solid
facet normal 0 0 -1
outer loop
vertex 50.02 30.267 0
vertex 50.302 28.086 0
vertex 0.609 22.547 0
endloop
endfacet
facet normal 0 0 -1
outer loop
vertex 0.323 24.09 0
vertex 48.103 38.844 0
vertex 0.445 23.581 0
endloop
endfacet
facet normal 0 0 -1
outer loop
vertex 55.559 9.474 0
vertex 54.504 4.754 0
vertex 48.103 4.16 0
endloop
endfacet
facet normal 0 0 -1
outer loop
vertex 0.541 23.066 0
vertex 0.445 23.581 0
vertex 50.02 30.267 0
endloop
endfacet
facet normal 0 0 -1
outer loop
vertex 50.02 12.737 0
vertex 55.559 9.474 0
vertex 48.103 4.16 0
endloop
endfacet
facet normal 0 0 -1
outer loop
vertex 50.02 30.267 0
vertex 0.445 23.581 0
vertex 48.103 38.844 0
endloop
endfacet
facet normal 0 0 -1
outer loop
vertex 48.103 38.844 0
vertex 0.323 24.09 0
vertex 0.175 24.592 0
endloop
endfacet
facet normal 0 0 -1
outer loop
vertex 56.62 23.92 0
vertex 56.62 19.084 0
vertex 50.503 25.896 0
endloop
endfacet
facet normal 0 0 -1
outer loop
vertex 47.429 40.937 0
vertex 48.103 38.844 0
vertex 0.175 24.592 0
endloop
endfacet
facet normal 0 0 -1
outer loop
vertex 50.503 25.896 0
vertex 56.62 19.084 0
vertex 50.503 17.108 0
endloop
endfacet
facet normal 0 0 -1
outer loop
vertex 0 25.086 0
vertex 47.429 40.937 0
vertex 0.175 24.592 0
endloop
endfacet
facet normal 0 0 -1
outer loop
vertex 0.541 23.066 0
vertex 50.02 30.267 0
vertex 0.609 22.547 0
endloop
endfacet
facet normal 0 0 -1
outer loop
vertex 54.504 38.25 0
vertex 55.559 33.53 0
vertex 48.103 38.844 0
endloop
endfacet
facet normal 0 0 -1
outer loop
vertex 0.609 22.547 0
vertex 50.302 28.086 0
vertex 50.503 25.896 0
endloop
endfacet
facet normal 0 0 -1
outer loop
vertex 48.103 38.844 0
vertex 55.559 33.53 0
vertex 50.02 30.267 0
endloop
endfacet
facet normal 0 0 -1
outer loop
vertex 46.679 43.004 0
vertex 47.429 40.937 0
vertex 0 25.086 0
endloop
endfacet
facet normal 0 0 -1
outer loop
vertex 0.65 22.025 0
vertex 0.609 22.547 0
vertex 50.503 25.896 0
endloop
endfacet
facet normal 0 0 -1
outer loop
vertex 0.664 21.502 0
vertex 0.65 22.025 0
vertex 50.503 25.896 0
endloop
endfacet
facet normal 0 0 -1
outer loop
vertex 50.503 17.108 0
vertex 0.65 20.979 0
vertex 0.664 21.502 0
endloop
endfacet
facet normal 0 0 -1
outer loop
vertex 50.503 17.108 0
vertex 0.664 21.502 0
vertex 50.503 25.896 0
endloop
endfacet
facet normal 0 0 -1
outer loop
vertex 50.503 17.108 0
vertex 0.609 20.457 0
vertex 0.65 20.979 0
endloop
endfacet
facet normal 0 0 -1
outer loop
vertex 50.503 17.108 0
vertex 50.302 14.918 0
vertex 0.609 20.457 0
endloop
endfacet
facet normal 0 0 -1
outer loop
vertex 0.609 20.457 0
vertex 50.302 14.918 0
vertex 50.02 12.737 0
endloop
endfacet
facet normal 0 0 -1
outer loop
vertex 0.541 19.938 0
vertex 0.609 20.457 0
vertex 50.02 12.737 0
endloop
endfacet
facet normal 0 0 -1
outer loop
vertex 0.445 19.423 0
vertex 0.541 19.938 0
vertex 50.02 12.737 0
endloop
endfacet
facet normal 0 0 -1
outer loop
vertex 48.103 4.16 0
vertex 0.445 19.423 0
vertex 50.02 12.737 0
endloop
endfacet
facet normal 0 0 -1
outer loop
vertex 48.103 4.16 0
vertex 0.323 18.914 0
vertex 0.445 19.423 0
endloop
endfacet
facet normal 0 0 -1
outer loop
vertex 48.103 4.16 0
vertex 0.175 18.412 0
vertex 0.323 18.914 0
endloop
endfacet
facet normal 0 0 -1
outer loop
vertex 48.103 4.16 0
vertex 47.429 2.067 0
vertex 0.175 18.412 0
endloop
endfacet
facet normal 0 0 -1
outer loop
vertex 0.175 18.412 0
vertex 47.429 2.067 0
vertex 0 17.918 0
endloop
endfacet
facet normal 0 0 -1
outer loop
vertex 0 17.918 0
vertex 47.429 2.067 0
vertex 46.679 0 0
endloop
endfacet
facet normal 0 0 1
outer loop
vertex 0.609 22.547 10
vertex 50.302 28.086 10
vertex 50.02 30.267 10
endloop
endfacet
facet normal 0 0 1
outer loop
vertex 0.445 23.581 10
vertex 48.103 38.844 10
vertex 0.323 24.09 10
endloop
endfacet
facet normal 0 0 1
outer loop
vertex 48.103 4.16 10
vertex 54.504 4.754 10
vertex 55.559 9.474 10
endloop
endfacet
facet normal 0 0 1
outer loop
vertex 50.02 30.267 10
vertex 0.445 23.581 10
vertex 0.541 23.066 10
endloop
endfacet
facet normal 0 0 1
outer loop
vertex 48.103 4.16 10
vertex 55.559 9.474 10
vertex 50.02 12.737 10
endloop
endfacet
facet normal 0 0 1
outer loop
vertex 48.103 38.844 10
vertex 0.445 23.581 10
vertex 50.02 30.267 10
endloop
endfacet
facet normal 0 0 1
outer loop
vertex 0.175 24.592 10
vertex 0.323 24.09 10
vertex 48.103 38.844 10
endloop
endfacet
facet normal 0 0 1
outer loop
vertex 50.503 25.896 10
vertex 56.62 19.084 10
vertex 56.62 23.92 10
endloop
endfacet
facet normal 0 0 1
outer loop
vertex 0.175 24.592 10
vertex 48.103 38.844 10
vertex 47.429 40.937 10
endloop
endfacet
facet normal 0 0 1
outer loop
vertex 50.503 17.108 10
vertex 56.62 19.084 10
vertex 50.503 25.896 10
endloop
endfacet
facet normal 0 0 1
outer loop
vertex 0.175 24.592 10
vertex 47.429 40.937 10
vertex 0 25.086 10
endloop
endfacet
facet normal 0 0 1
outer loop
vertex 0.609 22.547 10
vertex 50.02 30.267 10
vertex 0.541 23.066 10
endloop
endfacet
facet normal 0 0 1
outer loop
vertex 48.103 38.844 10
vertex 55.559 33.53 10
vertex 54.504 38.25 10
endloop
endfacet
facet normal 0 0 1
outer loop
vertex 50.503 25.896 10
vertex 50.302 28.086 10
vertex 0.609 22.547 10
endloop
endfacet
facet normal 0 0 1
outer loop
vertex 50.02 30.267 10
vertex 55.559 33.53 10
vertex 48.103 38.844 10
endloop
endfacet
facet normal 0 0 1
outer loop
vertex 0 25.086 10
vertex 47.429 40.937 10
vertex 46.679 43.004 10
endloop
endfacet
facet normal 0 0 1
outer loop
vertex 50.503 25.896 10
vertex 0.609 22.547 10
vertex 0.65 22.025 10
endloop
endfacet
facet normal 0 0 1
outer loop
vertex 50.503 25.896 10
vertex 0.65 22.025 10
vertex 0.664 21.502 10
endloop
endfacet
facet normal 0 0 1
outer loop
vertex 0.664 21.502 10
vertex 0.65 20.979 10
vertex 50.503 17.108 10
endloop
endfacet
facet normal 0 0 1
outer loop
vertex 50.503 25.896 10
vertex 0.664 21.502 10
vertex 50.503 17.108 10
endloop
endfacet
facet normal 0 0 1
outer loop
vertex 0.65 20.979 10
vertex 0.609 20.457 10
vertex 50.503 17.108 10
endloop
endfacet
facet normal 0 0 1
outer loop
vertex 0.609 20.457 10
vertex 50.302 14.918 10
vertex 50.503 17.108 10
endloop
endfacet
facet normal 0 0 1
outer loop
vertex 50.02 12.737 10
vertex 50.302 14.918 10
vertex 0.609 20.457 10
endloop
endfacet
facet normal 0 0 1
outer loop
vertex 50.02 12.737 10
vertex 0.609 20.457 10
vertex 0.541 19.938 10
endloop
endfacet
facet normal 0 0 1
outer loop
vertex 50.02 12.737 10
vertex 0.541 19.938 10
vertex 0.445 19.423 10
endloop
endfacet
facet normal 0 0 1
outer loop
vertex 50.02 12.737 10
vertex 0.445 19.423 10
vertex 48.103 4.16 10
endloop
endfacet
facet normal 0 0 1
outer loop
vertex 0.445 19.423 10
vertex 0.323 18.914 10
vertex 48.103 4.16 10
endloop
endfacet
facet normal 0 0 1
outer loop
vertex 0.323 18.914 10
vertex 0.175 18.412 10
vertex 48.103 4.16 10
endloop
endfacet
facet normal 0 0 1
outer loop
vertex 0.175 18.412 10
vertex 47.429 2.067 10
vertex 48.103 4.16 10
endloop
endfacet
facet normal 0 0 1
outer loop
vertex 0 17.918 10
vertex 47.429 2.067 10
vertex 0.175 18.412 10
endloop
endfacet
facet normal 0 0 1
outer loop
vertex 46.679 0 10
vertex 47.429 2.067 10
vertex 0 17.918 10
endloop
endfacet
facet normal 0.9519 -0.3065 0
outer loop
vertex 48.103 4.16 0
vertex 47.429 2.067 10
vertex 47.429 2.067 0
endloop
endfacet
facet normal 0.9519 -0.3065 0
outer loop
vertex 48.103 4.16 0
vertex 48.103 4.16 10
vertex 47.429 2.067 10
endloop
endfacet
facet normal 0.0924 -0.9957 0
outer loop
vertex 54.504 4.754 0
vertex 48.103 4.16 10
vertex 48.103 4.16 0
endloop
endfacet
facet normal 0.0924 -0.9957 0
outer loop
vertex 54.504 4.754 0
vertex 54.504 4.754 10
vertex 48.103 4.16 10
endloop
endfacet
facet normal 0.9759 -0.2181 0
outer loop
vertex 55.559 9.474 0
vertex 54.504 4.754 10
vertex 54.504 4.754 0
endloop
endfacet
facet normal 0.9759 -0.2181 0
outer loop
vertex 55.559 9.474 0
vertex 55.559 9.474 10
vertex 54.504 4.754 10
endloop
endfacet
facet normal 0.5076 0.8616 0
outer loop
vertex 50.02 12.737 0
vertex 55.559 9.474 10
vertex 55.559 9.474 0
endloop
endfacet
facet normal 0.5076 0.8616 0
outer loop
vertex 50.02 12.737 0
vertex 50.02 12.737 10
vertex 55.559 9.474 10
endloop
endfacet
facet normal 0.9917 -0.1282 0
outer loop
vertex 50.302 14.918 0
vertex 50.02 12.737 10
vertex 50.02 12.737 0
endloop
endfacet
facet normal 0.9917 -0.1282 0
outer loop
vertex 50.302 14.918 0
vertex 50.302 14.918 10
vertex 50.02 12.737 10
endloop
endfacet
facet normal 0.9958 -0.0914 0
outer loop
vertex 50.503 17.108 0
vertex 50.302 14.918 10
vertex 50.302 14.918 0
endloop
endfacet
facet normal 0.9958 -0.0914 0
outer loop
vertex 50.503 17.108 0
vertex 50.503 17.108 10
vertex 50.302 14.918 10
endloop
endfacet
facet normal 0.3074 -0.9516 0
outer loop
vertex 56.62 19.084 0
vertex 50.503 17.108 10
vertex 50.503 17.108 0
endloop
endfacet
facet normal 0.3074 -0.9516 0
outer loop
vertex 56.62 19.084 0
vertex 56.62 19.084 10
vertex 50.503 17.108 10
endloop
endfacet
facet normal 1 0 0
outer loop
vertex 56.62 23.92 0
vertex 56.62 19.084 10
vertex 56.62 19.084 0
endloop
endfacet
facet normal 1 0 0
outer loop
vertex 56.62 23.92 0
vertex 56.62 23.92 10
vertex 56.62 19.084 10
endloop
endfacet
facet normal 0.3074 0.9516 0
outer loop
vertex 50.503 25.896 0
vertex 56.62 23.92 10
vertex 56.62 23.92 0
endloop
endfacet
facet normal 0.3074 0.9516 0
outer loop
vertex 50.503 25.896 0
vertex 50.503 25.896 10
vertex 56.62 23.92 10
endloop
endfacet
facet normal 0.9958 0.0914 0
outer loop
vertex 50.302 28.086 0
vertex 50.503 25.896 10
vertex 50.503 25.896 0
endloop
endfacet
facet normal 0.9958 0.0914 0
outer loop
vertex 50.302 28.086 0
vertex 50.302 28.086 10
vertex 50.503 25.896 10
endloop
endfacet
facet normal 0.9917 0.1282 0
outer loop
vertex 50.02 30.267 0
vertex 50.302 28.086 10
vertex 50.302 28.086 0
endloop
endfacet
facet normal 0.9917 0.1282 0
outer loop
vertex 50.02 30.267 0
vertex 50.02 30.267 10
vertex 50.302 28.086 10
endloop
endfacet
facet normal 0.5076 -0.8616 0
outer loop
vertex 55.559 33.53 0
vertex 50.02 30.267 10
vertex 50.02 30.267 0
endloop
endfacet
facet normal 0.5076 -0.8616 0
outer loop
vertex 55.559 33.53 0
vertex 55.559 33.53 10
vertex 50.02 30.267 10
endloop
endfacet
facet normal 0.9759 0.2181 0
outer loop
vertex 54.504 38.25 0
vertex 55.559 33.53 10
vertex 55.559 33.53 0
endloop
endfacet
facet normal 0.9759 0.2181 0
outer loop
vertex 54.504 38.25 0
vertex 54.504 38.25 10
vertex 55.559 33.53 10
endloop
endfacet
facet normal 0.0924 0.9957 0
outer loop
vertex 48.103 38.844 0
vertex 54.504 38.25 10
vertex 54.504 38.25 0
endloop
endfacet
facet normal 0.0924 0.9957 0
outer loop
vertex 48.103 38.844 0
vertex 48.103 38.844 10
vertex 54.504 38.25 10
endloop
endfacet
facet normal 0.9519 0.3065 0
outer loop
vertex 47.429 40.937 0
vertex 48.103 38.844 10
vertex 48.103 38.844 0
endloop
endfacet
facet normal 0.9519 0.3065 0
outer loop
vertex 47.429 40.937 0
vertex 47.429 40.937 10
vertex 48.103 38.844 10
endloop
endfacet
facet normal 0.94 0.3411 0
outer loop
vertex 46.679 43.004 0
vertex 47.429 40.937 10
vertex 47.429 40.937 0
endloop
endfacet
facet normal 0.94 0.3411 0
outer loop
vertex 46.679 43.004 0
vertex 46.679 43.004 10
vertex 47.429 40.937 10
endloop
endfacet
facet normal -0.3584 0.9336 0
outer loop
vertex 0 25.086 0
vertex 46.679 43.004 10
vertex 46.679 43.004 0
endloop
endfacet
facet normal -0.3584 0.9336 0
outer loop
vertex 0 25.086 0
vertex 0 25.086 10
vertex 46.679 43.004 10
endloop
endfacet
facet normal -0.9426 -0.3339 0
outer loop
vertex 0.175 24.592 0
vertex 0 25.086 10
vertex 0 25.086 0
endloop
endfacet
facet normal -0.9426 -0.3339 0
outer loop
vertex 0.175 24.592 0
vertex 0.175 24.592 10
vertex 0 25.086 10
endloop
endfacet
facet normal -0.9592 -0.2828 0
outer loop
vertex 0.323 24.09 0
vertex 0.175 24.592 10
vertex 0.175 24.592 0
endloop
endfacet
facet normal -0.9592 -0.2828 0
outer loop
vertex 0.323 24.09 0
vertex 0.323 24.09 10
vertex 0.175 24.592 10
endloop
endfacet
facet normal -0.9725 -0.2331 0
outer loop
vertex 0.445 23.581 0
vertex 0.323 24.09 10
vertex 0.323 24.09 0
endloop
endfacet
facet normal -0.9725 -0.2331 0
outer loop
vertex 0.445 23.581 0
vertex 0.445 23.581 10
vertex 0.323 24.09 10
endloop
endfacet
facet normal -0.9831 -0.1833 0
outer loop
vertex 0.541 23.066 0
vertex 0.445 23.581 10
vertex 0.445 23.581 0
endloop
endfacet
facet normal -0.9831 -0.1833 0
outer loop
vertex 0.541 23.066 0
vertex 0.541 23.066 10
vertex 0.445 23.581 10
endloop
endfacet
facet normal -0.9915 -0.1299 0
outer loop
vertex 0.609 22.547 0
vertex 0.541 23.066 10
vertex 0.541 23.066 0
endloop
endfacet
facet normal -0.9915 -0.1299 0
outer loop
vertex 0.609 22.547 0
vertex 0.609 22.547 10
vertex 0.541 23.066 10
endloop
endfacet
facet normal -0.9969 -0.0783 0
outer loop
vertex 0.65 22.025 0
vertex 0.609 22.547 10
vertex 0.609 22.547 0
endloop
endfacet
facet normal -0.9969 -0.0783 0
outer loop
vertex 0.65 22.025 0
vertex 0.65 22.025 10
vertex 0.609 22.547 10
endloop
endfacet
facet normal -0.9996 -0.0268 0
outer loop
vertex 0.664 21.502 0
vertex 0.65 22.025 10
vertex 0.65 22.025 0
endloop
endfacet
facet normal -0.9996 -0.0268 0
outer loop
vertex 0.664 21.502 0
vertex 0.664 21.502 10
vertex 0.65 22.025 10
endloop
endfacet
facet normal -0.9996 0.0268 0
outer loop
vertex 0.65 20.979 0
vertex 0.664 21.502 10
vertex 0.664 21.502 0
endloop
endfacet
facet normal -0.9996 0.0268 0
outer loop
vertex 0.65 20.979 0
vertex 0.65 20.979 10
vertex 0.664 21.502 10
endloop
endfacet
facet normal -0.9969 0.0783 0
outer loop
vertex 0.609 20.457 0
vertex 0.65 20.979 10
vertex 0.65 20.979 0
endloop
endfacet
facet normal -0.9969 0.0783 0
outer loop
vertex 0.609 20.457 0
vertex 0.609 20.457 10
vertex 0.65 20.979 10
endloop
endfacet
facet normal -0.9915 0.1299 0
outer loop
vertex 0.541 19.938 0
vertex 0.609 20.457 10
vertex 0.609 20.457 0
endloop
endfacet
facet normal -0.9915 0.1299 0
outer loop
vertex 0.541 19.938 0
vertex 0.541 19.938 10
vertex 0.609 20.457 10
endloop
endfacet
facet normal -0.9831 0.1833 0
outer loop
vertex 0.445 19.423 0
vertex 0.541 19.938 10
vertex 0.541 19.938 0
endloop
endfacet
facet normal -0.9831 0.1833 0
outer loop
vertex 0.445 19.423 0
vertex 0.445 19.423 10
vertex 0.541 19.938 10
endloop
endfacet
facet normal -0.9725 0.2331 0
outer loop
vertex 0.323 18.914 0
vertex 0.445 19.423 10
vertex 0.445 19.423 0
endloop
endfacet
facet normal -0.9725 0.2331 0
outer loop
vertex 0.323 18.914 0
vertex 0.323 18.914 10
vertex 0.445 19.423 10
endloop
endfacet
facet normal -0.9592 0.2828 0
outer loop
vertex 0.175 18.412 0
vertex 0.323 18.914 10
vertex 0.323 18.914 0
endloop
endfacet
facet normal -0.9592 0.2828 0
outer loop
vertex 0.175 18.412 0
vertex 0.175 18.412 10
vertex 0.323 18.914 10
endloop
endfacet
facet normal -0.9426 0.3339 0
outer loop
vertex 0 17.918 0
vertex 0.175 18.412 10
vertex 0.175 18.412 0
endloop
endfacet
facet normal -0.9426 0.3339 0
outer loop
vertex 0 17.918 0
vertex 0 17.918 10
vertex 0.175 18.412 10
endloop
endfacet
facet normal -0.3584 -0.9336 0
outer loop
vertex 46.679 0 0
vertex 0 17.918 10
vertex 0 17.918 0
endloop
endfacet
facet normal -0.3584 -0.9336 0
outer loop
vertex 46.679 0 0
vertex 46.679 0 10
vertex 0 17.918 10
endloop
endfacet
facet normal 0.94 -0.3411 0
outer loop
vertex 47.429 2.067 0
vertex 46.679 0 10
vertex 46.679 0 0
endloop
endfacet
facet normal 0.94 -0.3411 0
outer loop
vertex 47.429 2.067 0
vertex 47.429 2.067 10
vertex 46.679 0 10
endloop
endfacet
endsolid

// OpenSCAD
$fn = 32;

// ----------------------------------------------------------------------
// Gear sector: 3 teeth on 42 degrees
// ----------------------------------------------------------------------

// --- parameters (mm) ---
sector_angle = 42;        // sector angle, degrees
root_r = 60;              // root circle radius
tooth_h = 6;              // tooth height over the root circle
teeth = 3;                // number of teeth on the sector
hub_r = 10;               // hub bore radius
plate_t = 10;             // sector thickness, Z
arc_step = 3;             // sampling step of the root/hub arcs, degrees

tip_r = root_r + tooth_h;  // tip circle radius

profile = [[46.679, 0], [47.429, 2.067], [48.103, 4.16], [54.504, 4.754], [55.559, 9.474], [50.02, 12.737], [50.302, 14.918], [50.503, 17.108], [56.62, 19.084], [56.62, 23.92], [50.503, 25.896], [50.302, 28.086], [50.02, 30.267], [55.559, 33.53], [54.504, 38.25], [48.103, 38.844], [47.429, 40.937], [46.679, 43.004], [0, 25.086], [0.175, 24.592], [0.323, 24.09], [0.445, 23.581], [0.541, 23.066], [0.609, 22.547], [0.65, 22.025], [0.664, 21.502], [0.65, 20.979], [0.609, 20.457], [0.541, 19.938], [0.445, 19.423], [0.323, 18.914], [0.175, 18.412], [0, 17.918]];  // primary outline, 33 points, counter clockwise

// --- the one profile operation ---
linear_extrude(height = plate_t) polygon(points = profile);
